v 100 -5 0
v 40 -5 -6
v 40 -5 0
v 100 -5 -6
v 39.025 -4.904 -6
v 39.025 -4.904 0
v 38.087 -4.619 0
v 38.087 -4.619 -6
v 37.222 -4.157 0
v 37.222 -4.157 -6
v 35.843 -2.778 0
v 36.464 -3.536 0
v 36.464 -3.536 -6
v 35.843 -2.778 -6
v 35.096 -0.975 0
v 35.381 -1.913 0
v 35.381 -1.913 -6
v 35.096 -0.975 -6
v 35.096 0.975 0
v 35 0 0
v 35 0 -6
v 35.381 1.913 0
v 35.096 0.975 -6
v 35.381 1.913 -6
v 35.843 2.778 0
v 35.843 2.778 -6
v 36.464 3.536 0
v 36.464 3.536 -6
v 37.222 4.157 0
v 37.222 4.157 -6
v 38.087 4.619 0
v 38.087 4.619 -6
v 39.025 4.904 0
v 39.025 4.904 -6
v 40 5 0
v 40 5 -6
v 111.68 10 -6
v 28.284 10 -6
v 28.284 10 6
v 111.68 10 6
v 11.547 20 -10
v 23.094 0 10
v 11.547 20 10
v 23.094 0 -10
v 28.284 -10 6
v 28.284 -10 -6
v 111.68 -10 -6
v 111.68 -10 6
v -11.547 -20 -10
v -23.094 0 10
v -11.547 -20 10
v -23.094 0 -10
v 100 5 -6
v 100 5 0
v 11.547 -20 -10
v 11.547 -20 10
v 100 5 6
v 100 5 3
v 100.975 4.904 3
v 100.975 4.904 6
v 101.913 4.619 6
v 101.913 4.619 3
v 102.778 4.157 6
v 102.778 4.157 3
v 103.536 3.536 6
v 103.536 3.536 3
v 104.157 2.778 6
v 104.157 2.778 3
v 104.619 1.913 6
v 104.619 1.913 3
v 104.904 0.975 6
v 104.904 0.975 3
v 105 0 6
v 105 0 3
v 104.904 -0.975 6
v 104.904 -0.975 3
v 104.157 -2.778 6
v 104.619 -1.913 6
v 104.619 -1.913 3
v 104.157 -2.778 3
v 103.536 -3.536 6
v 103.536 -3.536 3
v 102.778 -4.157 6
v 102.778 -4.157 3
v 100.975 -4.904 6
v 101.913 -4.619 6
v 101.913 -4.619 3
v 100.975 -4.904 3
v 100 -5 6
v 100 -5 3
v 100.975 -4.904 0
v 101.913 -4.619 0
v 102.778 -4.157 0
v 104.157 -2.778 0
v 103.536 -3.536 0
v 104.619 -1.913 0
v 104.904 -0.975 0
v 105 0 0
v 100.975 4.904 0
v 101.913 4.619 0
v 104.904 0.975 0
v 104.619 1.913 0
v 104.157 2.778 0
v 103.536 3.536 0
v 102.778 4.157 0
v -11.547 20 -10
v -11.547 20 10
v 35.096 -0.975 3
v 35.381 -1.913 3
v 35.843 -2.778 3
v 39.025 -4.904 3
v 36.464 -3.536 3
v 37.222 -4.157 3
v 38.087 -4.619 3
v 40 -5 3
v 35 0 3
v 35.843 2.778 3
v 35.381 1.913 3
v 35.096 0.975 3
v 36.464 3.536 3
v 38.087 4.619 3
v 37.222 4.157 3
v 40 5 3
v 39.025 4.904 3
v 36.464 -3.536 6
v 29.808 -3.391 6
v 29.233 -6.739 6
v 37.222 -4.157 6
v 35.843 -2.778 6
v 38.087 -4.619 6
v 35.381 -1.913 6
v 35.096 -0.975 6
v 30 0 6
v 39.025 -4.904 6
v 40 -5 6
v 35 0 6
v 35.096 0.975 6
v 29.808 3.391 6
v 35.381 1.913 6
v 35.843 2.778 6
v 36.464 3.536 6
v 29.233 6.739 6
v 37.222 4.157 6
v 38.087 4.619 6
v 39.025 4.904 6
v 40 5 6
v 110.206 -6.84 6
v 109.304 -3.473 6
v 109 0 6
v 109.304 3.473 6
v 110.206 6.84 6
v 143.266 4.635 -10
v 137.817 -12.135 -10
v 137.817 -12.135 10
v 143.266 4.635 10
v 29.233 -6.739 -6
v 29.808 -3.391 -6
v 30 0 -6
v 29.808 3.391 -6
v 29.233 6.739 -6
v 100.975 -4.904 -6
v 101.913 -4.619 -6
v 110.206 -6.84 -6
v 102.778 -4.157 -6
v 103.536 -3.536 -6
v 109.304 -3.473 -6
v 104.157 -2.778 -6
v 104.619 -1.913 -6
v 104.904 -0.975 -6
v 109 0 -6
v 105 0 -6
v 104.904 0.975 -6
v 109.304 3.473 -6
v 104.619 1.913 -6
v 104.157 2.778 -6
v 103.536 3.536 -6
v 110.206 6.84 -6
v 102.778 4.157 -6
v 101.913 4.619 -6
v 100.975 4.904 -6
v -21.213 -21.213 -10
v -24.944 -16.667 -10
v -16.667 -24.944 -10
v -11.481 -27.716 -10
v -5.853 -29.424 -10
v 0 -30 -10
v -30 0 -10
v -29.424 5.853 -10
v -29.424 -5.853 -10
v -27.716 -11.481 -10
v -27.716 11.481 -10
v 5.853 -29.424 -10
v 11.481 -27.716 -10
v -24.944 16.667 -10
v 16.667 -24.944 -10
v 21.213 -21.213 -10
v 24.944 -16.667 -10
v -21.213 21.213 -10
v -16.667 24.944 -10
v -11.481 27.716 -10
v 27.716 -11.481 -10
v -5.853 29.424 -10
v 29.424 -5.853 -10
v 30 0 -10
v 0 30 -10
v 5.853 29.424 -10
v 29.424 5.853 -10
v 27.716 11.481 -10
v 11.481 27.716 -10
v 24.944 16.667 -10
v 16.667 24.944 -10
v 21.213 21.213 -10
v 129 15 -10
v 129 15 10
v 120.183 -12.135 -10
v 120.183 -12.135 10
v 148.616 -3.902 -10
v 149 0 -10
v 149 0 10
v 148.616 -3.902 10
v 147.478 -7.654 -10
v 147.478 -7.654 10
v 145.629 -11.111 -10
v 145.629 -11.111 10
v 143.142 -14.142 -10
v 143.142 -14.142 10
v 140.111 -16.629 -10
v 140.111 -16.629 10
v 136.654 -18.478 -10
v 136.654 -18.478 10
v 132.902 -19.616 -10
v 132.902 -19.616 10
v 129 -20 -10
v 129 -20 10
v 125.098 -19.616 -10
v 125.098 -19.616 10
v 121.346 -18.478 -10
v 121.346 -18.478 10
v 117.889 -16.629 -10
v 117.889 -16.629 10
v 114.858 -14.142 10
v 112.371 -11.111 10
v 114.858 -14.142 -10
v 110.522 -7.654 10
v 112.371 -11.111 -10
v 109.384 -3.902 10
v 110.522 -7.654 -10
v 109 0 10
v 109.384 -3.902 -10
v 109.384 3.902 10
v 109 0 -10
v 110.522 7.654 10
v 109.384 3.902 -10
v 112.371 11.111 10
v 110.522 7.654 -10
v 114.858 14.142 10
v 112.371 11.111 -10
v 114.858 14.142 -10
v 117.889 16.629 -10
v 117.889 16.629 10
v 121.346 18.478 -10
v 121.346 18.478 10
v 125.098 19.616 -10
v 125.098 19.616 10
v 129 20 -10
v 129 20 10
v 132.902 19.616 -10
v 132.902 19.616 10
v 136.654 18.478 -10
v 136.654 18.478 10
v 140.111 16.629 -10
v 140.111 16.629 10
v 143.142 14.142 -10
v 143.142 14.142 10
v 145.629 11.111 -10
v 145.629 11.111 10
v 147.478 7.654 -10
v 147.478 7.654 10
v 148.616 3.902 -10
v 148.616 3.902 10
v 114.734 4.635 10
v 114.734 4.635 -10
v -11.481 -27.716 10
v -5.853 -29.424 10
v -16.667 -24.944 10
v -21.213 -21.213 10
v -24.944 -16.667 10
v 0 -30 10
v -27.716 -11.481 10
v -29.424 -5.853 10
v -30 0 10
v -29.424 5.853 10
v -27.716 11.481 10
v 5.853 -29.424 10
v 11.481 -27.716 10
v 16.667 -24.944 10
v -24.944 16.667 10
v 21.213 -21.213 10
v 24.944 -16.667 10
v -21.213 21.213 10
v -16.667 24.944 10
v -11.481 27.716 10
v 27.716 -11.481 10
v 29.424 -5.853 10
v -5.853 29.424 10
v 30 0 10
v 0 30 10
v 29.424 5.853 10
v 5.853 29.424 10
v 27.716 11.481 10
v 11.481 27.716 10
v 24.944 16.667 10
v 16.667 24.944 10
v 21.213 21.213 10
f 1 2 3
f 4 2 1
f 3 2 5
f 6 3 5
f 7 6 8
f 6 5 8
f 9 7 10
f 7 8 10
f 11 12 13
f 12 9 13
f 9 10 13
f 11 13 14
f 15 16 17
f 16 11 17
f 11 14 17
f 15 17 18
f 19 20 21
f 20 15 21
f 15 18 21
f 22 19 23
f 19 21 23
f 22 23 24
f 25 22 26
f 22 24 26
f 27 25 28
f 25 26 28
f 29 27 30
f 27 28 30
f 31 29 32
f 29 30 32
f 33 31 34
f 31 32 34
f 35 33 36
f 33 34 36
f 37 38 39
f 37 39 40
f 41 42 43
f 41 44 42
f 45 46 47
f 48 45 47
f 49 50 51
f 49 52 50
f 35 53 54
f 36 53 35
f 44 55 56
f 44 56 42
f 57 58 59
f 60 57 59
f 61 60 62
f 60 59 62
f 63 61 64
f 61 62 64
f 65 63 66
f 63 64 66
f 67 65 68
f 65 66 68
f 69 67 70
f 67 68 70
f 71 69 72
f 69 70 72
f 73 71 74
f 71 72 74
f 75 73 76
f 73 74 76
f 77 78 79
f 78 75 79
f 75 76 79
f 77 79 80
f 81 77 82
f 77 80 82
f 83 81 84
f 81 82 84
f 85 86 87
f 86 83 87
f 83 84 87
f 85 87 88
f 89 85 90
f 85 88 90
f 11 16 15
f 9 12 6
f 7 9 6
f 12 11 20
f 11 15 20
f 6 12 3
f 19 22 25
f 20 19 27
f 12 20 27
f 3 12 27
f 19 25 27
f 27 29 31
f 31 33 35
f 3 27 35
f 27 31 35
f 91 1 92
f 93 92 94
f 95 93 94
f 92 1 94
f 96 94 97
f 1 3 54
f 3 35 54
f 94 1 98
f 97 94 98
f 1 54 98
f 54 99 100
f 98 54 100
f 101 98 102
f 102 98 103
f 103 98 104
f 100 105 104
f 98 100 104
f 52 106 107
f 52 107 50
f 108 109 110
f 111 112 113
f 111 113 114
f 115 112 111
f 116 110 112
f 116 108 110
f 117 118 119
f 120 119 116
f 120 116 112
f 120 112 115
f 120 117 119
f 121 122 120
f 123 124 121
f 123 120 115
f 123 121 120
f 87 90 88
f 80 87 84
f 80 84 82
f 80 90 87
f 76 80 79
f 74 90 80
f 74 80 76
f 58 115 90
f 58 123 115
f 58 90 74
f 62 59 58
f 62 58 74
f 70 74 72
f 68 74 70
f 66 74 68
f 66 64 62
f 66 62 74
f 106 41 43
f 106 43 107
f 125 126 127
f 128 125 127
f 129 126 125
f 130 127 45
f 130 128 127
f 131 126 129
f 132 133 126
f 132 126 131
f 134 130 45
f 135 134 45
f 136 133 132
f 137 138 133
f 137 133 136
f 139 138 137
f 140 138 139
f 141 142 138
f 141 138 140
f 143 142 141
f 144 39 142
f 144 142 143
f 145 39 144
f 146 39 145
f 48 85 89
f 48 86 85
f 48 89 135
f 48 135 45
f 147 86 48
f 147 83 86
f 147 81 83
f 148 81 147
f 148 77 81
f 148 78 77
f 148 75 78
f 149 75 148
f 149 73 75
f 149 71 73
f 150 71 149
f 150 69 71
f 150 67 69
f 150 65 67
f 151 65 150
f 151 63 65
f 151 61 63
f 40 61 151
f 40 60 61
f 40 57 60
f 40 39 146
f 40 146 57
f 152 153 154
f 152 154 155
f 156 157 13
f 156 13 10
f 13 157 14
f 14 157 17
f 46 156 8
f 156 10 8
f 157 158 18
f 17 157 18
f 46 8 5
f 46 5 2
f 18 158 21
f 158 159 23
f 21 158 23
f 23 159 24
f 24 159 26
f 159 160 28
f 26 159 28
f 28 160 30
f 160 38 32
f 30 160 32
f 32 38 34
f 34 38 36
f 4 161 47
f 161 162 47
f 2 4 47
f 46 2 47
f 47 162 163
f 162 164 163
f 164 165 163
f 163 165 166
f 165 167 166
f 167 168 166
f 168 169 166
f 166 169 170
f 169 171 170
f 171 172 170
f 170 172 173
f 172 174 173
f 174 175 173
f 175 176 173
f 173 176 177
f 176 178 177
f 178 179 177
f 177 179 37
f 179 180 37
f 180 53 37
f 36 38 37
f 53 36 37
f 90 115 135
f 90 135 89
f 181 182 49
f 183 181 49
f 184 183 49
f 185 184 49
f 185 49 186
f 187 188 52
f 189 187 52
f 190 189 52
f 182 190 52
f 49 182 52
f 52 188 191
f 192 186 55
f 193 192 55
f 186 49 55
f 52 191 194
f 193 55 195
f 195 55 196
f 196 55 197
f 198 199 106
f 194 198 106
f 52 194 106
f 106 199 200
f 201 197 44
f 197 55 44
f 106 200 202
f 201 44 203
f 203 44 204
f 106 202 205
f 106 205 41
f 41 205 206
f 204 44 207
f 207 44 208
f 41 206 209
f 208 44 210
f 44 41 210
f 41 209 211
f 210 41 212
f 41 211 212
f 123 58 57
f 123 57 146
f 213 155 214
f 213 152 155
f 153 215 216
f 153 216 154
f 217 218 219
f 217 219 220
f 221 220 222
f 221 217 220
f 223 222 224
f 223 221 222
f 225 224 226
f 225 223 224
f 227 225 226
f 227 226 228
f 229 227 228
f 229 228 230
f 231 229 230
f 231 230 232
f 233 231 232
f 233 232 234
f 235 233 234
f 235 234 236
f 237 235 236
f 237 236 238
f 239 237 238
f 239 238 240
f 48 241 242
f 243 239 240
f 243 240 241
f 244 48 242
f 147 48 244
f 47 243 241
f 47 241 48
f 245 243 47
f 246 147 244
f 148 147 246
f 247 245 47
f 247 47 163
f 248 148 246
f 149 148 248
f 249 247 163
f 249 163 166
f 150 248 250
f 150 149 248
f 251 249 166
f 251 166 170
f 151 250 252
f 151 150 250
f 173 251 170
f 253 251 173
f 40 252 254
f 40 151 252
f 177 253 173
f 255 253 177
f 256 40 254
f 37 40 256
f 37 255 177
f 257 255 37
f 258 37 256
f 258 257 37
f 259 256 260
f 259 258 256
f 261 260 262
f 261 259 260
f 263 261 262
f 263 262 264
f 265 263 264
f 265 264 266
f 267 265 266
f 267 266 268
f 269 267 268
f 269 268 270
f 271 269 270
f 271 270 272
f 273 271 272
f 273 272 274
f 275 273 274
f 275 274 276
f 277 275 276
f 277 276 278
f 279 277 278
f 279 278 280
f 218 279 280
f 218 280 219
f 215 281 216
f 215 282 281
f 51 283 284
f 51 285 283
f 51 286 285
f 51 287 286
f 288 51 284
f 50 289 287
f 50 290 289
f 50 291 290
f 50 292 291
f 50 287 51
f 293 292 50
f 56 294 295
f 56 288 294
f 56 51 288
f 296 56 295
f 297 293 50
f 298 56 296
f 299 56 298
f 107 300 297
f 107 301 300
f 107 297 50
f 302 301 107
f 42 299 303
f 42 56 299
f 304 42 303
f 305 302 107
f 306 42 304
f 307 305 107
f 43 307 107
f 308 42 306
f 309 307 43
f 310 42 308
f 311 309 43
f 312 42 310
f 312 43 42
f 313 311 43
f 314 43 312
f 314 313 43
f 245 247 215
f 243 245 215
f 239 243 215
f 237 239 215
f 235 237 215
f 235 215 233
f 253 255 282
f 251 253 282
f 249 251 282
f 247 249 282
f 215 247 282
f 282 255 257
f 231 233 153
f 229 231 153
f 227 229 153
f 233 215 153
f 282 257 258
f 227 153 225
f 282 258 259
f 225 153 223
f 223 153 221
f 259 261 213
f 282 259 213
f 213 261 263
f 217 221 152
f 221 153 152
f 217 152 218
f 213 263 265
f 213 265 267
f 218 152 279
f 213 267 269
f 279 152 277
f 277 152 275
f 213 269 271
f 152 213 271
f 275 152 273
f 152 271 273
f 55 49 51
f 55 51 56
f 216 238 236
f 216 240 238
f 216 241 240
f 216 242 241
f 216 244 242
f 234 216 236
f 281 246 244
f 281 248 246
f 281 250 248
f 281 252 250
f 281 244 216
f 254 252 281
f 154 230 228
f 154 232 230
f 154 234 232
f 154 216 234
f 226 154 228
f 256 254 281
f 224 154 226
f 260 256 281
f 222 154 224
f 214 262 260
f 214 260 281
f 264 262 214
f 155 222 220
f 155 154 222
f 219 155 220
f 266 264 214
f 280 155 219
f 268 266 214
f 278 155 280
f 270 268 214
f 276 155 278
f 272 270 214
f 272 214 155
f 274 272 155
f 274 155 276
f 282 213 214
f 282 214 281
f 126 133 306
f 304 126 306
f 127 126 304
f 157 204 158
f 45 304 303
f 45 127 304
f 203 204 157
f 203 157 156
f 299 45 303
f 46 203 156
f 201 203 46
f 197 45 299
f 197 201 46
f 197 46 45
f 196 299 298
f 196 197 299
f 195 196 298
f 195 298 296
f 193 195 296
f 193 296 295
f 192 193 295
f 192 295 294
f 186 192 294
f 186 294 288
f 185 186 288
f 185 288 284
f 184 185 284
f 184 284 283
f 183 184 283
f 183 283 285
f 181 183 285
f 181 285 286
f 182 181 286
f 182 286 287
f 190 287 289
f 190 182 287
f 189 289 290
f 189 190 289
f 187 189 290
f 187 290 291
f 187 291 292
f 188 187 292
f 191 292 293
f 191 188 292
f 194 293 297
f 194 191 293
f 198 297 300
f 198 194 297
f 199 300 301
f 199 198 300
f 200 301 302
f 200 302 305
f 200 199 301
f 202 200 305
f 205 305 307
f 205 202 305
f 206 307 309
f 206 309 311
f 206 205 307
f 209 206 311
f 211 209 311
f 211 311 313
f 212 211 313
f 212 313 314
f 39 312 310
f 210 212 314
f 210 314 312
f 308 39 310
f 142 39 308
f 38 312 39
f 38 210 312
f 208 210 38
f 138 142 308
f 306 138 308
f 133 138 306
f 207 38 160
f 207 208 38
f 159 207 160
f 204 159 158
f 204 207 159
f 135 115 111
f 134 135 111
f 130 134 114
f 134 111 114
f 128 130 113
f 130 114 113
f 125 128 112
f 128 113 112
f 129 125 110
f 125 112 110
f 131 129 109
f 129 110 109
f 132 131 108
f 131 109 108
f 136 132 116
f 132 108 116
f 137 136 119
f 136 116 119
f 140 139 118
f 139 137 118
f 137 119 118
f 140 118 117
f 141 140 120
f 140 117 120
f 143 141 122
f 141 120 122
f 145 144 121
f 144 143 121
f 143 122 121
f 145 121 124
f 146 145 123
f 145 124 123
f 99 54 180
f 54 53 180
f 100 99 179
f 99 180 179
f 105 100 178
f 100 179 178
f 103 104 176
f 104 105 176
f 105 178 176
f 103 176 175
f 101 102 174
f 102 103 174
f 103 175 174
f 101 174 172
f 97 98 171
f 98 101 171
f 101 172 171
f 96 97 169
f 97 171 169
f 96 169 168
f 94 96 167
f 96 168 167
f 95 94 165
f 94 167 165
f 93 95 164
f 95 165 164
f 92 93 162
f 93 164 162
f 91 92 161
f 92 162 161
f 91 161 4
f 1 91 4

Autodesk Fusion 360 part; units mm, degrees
sketch "Sketch1" plane through (0, 0, 0) normal (0, 0, 1) x (1, 0, 0)
  circle A0 centre (0, 0) radius 30
  circle A1 centre (129, 0) radius 20
  line L0 (129, 15) -> (114.7342, 4.6353)
  line L1 (114.7342, 4.6353) -> (120.1832, -12.1353)
  line L2 (120.1832, -12.1353) -> (137.8168, -12.1353)
  line L3 (137.8168, -12.1353) -> (143.2658, 4.6353)
  line L4 (143.2658, 4.6353) -> (129, 15)
  line L5 (-11.547, 20) -> (-23.094, 0)
  line L6 (-23.094, 0) -> (-11.547, -20)
  line L7 (-11.547, -20) -> (11.547, -20)
  line L8 (11.547, -20) -> (23.094, 0)
  line L9 (23.094, 0) -> (11.547, 20)
  line L10 (11.547, 20) -> (-11.547, 20)
  line L11 (28.2843, 10) -> (111.6795, 10)
  line L12 (28.2843, -10) -> (111.6795, -10)
  line L13 (100, 5) -> (40, 5)
  line L14 (40, -5) -> (100, -5)
  line L15 (105, 5) -> (35, -5) construction
  line L16 (35, 5) -> (105, -5) construction
  arc A2 (40, 5) -> (40, -5) centre (40, 0) ccw
  arc A3 (100, -5) -> (100, 5) centre (100, 0) ccw
  point P0 (129, 0)
  point P1 (70, 0)
  dimension "d6" = 129
  dimension "d9" = 20
  dimension "d10" = 60
  dimension "d11" = 40
  dimension "d12" = 15
  dimension "d17" = 70
  dimension "d18" = 10
extrude "Extrude1" add sketch "Sketch1" along normal mid plane 20 contours A0 | A1 makes body 1 at (27.1662, -12.7278, 3.3333) makes body 2 at (148.9006, -1.9914, -3.3333)
extrude "Extrude2" add sketch "Sketch1" along normal mid plane 12 contours A0 A1 L11 L12 bodies 1 2
extrude "Extrude3" add sketch "Sketch1" along normal blind 3 contours L13 L14 A2 A3 bodies 1
